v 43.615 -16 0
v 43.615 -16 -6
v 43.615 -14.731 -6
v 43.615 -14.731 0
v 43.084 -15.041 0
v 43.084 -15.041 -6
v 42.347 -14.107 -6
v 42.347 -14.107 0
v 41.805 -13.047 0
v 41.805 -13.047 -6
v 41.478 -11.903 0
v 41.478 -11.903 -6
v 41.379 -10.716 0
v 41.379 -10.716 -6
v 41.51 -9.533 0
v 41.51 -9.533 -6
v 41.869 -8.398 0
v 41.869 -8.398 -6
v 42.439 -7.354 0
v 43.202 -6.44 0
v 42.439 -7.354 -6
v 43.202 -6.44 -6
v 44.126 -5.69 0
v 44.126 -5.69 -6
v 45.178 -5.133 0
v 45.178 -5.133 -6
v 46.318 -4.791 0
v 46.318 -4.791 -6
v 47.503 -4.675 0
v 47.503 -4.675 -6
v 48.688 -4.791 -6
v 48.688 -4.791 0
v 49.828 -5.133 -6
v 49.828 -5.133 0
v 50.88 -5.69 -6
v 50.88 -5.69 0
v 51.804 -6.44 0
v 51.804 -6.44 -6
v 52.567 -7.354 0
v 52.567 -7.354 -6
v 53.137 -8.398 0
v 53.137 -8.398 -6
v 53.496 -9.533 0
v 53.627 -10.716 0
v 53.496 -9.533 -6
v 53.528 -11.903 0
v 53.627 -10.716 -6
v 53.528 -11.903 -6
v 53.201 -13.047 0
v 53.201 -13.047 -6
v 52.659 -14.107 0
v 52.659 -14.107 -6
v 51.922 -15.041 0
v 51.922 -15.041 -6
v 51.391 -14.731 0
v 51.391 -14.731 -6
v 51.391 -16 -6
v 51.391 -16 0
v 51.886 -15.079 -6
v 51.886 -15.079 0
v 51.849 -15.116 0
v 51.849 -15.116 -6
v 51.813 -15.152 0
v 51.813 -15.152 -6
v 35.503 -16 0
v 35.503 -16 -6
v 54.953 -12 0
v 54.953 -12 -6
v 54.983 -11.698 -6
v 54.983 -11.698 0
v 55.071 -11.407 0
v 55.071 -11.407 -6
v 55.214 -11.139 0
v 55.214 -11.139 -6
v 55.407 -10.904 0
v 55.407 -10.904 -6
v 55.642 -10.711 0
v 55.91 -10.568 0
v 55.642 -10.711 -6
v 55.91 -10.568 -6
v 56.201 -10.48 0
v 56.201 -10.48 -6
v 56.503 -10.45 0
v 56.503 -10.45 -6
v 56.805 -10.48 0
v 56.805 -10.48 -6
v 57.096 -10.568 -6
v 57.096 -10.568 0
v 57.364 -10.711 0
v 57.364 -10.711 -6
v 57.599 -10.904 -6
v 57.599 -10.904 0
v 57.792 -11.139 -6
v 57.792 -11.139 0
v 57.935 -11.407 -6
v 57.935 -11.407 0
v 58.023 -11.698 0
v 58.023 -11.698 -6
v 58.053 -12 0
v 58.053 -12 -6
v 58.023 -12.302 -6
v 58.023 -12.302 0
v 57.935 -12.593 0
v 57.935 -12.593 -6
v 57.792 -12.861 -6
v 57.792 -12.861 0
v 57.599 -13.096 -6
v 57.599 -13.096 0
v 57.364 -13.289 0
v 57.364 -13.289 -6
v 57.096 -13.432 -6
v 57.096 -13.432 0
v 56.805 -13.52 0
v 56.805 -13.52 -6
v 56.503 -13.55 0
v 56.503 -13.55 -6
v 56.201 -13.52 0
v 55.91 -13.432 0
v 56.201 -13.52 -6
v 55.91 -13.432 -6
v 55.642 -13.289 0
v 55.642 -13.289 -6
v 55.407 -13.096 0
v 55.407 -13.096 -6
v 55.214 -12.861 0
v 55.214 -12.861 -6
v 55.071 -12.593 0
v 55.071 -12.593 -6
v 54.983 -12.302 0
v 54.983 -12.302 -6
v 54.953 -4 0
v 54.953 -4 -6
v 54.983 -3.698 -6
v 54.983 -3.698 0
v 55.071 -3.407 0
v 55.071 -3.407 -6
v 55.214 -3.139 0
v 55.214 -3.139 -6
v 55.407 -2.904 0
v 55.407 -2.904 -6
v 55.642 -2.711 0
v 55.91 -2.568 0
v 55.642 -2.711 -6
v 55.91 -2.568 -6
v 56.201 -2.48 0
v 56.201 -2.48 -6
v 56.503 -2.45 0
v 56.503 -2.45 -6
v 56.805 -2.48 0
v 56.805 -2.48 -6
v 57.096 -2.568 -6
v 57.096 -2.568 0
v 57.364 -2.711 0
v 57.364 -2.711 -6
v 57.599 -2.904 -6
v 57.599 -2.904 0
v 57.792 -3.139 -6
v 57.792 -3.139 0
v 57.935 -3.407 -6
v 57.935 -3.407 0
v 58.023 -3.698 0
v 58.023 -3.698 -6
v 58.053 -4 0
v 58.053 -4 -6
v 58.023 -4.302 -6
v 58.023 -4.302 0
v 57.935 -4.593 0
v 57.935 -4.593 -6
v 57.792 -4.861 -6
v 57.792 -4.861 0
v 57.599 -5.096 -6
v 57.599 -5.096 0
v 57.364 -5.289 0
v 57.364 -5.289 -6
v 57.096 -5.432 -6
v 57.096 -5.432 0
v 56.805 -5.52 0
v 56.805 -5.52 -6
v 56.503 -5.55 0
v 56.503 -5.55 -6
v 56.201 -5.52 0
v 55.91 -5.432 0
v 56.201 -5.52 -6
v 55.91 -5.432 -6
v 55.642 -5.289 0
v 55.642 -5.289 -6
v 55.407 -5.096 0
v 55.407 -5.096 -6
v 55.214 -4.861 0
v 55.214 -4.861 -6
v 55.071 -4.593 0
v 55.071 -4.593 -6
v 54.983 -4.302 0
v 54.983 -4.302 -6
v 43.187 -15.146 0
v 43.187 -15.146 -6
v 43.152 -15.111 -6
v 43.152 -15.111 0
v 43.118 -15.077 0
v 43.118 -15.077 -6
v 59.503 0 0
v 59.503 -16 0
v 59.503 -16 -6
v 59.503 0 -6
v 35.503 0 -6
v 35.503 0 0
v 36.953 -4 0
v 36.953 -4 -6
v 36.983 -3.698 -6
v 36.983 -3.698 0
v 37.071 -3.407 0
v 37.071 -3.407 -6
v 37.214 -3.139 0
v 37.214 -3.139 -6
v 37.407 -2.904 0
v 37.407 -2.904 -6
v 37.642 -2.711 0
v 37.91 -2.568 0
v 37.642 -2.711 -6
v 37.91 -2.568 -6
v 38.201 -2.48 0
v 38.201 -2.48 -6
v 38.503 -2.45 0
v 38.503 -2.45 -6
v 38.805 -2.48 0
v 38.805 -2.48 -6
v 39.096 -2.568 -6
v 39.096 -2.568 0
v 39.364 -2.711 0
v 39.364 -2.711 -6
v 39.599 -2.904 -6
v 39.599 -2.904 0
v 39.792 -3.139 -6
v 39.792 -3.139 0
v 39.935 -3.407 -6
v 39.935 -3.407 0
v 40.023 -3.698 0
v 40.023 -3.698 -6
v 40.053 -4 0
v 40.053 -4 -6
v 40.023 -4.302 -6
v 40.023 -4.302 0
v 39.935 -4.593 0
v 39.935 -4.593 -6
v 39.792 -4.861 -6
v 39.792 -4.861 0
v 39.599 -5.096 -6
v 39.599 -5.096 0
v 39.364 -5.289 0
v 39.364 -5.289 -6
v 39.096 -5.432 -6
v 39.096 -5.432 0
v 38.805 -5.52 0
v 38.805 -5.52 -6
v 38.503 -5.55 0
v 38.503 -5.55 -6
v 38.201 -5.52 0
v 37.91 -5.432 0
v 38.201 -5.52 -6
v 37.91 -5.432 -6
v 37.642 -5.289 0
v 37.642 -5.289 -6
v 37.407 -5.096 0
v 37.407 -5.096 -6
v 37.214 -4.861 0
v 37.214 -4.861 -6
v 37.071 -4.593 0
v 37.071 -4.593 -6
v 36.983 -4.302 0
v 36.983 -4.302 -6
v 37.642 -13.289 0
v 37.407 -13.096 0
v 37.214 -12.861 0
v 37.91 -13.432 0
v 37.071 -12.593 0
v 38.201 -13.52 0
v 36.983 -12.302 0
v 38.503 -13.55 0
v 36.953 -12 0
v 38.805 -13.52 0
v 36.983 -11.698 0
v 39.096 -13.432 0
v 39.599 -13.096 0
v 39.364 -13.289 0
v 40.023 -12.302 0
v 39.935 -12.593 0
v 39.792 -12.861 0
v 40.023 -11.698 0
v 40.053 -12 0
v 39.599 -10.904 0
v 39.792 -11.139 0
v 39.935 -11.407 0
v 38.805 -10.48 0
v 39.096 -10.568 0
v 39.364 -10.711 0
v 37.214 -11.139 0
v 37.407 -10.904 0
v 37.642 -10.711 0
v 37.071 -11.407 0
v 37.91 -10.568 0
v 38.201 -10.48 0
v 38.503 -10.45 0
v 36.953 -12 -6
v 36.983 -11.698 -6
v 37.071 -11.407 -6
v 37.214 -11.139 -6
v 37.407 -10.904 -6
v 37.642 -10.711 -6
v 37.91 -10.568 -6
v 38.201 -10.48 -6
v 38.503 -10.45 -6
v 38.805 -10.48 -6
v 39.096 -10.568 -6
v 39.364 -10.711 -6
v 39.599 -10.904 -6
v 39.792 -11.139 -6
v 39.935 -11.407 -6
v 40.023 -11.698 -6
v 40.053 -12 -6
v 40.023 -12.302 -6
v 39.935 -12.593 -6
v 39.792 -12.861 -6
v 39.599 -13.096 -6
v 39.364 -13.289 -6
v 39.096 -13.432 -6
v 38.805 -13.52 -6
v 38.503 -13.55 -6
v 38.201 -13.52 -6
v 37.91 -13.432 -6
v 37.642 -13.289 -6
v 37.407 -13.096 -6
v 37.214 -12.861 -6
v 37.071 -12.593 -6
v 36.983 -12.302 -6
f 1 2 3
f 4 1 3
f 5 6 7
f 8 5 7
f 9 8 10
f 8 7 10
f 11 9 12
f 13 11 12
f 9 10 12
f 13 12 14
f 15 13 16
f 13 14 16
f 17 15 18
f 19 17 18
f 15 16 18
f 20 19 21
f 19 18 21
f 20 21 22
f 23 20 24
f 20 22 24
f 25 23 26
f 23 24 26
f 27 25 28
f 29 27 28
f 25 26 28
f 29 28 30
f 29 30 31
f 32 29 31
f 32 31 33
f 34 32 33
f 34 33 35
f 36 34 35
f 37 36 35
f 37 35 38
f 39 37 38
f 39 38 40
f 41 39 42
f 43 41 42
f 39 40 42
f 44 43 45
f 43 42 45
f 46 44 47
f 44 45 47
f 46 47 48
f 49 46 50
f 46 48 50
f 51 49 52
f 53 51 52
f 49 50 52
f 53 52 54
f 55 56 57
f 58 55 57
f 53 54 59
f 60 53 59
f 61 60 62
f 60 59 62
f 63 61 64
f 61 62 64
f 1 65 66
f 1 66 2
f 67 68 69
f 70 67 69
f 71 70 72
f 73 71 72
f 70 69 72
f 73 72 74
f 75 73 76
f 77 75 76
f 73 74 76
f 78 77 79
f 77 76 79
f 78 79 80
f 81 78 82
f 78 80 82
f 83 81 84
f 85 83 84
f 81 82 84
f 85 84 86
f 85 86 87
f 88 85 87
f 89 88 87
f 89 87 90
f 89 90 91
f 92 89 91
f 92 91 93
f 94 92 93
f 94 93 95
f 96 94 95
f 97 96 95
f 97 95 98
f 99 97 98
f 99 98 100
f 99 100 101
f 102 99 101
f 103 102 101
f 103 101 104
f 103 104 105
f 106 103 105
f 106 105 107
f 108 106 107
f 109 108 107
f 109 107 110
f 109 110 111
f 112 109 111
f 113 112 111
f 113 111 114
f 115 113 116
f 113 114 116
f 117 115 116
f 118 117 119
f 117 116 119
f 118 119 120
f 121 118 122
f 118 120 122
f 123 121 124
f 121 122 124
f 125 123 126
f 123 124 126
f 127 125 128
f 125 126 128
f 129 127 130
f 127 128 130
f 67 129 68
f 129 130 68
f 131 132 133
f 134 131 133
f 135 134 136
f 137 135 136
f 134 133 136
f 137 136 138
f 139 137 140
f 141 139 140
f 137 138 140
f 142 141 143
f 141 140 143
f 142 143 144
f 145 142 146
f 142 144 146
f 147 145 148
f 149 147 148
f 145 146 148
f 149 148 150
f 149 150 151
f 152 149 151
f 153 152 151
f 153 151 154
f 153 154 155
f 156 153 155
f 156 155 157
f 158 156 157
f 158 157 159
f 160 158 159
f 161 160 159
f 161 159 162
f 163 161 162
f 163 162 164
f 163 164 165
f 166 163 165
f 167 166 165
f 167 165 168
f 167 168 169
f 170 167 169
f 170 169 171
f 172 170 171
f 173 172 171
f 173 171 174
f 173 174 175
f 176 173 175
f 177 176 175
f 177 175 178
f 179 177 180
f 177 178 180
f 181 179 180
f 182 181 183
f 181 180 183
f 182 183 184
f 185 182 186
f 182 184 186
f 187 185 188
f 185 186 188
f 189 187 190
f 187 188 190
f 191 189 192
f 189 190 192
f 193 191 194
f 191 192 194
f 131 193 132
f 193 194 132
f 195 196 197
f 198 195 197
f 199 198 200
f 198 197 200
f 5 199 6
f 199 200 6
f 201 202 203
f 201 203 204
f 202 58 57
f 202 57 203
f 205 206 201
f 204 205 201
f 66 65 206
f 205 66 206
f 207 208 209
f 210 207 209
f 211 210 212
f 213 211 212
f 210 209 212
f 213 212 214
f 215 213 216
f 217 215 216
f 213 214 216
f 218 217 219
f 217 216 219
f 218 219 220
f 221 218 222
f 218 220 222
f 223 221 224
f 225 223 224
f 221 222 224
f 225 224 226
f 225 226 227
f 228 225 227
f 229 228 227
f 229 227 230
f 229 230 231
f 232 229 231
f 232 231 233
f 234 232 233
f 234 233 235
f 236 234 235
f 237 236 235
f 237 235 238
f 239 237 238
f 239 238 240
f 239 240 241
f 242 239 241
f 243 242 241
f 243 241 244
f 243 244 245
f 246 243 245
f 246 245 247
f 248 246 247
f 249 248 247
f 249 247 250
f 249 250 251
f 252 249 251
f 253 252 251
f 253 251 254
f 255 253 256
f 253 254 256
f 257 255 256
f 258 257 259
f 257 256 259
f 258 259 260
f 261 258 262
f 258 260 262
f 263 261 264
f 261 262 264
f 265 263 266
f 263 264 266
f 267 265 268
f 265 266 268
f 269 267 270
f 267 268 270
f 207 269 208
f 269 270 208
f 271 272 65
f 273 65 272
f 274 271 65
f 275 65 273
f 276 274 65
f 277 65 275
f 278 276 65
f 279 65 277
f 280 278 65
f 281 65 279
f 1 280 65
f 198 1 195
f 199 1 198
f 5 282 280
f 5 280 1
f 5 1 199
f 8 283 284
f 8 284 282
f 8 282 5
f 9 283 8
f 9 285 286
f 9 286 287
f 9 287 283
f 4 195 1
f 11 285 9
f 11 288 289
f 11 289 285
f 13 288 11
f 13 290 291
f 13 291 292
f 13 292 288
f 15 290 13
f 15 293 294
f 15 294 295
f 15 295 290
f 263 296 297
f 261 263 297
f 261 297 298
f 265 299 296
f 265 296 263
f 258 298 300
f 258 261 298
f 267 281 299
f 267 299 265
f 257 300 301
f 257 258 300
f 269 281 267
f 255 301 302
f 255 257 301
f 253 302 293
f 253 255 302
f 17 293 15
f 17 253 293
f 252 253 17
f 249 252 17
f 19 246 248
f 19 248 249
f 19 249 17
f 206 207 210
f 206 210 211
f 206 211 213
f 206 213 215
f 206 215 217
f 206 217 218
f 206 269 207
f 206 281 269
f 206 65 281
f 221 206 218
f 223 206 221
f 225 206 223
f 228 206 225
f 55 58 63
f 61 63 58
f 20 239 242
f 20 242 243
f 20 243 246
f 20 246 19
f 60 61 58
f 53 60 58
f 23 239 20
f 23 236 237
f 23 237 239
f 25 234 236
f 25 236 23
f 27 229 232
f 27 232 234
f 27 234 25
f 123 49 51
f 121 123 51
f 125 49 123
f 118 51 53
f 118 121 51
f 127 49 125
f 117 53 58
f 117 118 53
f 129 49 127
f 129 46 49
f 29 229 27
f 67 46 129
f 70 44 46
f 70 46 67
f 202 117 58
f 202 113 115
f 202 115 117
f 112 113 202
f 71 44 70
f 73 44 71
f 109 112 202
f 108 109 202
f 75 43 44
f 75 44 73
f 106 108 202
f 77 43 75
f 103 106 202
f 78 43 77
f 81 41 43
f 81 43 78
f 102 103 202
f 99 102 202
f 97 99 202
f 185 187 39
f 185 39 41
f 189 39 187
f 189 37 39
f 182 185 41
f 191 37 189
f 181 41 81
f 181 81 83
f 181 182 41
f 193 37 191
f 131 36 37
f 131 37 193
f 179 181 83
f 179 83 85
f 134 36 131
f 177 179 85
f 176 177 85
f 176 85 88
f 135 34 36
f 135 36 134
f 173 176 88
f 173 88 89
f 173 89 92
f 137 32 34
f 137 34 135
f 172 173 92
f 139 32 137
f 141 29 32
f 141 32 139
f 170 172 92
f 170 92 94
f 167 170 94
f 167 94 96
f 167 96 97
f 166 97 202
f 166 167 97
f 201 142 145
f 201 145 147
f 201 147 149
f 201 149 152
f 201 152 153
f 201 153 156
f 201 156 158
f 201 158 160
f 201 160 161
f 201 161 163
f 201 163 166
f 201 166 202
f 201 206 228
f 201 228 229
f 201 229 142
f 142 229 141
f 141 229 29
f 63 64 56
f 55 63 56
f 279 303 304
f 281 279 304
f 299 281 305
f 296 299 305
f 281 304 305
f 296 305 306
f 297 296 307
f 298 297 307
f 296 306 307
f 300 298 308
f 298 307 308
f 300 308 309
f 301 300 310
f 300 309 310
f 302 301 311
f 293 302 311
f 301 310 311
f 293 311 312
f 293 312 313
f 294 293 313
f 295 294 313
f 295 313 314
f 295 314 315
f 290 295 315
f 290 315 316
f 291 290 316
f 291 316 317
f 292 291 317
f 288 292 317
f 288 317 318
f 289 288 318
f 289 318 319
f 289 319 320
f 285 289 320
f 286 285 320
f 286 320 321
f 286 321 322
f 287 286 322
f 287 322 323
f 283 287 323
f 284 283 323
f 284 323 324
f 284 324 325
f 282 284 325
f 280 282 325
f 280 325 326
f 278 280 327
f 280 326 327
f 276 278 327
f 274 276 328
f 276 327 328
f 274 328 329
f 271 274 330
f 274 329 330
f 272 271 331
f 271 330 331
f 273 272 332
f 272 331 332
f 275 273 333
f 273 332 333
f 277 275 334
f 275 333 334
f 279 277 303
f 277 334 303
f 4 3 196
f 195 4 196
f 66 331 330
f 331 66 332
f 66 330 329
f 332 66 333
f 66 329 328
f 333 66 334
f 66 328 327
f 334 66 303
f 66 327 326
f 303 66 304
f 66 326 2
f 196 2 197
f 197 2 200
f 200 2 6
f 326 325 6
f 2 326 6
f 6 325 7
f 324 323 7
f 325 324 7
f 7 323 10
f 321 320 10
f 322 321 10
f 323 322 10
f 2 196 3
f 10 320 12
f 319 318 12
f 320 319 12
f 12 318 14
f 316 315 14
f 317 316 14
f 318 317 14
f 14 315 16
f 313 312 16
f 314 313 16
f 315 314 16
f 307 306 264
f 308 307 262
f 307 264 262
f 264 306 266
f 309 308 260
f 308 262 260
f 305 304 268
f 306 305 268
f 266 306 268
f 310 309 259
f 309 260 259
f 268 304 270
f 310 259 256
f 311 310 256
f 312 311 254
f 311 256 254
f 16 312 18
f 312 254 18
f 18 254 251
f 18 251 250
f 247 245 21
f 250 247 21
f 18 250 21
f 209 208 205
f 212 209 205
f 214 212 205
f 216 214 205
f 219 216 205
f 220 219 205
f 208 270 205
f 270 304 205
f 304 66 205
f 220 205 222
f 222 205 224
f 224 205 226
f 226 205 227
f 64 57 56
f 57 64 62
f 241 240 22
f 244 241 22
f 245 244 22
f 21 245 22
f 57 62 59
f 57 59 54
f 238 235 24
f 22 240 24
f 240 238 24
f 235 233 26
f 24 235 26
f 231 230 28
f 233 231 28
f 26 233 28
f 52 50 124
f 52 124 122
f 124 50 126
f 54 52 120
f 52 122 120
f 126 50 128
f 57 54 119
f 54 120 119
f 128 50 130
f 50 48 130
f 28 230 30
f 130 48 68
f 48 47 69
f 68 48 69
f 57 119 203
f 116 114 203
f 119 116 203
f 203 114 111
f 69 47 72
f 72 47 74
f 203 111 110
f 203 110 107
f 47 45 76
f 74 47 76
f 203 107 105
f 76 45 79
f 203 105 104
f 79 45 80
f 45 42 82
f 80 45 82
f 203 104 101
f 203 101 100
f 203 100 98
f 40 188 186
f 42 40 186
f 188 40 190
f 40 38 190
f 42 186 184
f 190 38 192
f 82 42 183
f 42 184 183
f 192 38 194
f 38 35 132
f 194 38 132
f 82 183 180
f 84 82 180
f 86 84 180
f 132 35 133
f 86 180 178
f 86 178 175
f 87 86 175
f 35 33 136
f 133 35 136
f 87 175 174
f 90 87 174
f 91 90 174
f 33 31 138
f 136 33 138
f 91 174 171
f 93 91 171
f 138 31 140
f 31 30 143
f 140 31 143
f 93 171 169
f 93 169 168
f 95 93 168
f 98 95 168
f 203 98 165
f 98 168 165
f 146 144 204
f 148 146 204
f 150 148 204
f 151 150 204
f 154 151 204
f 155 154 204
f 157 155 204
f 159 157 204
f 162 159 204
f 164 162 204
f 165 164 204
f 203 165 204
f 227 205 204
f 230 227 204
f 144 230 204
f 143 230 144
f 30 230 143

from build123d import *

# Parameters (mm, degrees)
SZKIC1_W                    = 24
SZKIC1_H                    = 16
DODANIE_WYCI_GNI_CIE1_DEPTH = 6
WYTNIJ_WYCI_GNI_CIE1_DEPTH  = 6
SZKIC3_R                    = 1.55
WYTNIJ_WYCI_GNI_CIE2_DEPTH  = 62.908035593


with BuildPart() as part:
    # Szkic1 → Dodanie-wyciągnięcie1 (new body)
    with BuildSketch(Plane.XY):
        with Locations((47.502982034, -8)):
            Rectangle(SZKIC1_W, SZKIC1_H)
    extrude(amount=-DODANIE_WYCI_GNI_CIE1_DEPTH)

    # Szkic2 → Wytnij-wyciągnięcie1 (cut)
    with BuildSketch(Plane.XY.offset(-6)):
        with BuildLine():
            Line((43.614537615, -16), (43.614537615, -14.730541148))
            Line((43.614537615, -14.730541148), (43.186780246, -15.145805693))
            ThreePointArc((43.186780246, -15.145805693), (43.13517548, -15.093936528), (43.084193998, -15.041454619))
            ThreePointArc((43.084193998, -15.041454619), (47.502982034, -4.675), (51.921770071, -15.041454619))
            ThreePointArc((51.921770071, -15.041454619), (51.867648174, -15.097128633), (51.812824874, -15.152112096))
            Line((51.812824874, -15.152112096), (51.391426454, -14.730541148))
            Line((51.391426454, -14.730541148), (51.391426454, -16))
            Line((51.391426454, -16), (43.614537615, -16))
        make_face()
    extrude(amount=WYTNIJ_WYCI_GNI_CIE1_DEPTH, mode=Mode.SUBTRACT)

    # Szkic3 → Wytnij-wyciągnięcie2 (cut, through all)
    with BuildSketch(Plane(origin=(0, 0, -6), x_dir=(-1, 0, 0), z_dir=(0, 0, -1))):
        with Locations((-56.502982034, -12)):
            Circle(SZKIC3_R)
        with Locations((-56.502982034, -4)):
            Circle(SZKIC3_R)
        with Locations((-38.502982034, -4)):
            Circle(SZKIC3_R)
        with Locations((-38.502982034, -12)):
            Circle(SZKIC3_R)
    extrude(amount=-WYTNIJ_WYCI_GNI_CIE2_DEPTH, mode=Mode.SUBTRACT)


solid = part.part
